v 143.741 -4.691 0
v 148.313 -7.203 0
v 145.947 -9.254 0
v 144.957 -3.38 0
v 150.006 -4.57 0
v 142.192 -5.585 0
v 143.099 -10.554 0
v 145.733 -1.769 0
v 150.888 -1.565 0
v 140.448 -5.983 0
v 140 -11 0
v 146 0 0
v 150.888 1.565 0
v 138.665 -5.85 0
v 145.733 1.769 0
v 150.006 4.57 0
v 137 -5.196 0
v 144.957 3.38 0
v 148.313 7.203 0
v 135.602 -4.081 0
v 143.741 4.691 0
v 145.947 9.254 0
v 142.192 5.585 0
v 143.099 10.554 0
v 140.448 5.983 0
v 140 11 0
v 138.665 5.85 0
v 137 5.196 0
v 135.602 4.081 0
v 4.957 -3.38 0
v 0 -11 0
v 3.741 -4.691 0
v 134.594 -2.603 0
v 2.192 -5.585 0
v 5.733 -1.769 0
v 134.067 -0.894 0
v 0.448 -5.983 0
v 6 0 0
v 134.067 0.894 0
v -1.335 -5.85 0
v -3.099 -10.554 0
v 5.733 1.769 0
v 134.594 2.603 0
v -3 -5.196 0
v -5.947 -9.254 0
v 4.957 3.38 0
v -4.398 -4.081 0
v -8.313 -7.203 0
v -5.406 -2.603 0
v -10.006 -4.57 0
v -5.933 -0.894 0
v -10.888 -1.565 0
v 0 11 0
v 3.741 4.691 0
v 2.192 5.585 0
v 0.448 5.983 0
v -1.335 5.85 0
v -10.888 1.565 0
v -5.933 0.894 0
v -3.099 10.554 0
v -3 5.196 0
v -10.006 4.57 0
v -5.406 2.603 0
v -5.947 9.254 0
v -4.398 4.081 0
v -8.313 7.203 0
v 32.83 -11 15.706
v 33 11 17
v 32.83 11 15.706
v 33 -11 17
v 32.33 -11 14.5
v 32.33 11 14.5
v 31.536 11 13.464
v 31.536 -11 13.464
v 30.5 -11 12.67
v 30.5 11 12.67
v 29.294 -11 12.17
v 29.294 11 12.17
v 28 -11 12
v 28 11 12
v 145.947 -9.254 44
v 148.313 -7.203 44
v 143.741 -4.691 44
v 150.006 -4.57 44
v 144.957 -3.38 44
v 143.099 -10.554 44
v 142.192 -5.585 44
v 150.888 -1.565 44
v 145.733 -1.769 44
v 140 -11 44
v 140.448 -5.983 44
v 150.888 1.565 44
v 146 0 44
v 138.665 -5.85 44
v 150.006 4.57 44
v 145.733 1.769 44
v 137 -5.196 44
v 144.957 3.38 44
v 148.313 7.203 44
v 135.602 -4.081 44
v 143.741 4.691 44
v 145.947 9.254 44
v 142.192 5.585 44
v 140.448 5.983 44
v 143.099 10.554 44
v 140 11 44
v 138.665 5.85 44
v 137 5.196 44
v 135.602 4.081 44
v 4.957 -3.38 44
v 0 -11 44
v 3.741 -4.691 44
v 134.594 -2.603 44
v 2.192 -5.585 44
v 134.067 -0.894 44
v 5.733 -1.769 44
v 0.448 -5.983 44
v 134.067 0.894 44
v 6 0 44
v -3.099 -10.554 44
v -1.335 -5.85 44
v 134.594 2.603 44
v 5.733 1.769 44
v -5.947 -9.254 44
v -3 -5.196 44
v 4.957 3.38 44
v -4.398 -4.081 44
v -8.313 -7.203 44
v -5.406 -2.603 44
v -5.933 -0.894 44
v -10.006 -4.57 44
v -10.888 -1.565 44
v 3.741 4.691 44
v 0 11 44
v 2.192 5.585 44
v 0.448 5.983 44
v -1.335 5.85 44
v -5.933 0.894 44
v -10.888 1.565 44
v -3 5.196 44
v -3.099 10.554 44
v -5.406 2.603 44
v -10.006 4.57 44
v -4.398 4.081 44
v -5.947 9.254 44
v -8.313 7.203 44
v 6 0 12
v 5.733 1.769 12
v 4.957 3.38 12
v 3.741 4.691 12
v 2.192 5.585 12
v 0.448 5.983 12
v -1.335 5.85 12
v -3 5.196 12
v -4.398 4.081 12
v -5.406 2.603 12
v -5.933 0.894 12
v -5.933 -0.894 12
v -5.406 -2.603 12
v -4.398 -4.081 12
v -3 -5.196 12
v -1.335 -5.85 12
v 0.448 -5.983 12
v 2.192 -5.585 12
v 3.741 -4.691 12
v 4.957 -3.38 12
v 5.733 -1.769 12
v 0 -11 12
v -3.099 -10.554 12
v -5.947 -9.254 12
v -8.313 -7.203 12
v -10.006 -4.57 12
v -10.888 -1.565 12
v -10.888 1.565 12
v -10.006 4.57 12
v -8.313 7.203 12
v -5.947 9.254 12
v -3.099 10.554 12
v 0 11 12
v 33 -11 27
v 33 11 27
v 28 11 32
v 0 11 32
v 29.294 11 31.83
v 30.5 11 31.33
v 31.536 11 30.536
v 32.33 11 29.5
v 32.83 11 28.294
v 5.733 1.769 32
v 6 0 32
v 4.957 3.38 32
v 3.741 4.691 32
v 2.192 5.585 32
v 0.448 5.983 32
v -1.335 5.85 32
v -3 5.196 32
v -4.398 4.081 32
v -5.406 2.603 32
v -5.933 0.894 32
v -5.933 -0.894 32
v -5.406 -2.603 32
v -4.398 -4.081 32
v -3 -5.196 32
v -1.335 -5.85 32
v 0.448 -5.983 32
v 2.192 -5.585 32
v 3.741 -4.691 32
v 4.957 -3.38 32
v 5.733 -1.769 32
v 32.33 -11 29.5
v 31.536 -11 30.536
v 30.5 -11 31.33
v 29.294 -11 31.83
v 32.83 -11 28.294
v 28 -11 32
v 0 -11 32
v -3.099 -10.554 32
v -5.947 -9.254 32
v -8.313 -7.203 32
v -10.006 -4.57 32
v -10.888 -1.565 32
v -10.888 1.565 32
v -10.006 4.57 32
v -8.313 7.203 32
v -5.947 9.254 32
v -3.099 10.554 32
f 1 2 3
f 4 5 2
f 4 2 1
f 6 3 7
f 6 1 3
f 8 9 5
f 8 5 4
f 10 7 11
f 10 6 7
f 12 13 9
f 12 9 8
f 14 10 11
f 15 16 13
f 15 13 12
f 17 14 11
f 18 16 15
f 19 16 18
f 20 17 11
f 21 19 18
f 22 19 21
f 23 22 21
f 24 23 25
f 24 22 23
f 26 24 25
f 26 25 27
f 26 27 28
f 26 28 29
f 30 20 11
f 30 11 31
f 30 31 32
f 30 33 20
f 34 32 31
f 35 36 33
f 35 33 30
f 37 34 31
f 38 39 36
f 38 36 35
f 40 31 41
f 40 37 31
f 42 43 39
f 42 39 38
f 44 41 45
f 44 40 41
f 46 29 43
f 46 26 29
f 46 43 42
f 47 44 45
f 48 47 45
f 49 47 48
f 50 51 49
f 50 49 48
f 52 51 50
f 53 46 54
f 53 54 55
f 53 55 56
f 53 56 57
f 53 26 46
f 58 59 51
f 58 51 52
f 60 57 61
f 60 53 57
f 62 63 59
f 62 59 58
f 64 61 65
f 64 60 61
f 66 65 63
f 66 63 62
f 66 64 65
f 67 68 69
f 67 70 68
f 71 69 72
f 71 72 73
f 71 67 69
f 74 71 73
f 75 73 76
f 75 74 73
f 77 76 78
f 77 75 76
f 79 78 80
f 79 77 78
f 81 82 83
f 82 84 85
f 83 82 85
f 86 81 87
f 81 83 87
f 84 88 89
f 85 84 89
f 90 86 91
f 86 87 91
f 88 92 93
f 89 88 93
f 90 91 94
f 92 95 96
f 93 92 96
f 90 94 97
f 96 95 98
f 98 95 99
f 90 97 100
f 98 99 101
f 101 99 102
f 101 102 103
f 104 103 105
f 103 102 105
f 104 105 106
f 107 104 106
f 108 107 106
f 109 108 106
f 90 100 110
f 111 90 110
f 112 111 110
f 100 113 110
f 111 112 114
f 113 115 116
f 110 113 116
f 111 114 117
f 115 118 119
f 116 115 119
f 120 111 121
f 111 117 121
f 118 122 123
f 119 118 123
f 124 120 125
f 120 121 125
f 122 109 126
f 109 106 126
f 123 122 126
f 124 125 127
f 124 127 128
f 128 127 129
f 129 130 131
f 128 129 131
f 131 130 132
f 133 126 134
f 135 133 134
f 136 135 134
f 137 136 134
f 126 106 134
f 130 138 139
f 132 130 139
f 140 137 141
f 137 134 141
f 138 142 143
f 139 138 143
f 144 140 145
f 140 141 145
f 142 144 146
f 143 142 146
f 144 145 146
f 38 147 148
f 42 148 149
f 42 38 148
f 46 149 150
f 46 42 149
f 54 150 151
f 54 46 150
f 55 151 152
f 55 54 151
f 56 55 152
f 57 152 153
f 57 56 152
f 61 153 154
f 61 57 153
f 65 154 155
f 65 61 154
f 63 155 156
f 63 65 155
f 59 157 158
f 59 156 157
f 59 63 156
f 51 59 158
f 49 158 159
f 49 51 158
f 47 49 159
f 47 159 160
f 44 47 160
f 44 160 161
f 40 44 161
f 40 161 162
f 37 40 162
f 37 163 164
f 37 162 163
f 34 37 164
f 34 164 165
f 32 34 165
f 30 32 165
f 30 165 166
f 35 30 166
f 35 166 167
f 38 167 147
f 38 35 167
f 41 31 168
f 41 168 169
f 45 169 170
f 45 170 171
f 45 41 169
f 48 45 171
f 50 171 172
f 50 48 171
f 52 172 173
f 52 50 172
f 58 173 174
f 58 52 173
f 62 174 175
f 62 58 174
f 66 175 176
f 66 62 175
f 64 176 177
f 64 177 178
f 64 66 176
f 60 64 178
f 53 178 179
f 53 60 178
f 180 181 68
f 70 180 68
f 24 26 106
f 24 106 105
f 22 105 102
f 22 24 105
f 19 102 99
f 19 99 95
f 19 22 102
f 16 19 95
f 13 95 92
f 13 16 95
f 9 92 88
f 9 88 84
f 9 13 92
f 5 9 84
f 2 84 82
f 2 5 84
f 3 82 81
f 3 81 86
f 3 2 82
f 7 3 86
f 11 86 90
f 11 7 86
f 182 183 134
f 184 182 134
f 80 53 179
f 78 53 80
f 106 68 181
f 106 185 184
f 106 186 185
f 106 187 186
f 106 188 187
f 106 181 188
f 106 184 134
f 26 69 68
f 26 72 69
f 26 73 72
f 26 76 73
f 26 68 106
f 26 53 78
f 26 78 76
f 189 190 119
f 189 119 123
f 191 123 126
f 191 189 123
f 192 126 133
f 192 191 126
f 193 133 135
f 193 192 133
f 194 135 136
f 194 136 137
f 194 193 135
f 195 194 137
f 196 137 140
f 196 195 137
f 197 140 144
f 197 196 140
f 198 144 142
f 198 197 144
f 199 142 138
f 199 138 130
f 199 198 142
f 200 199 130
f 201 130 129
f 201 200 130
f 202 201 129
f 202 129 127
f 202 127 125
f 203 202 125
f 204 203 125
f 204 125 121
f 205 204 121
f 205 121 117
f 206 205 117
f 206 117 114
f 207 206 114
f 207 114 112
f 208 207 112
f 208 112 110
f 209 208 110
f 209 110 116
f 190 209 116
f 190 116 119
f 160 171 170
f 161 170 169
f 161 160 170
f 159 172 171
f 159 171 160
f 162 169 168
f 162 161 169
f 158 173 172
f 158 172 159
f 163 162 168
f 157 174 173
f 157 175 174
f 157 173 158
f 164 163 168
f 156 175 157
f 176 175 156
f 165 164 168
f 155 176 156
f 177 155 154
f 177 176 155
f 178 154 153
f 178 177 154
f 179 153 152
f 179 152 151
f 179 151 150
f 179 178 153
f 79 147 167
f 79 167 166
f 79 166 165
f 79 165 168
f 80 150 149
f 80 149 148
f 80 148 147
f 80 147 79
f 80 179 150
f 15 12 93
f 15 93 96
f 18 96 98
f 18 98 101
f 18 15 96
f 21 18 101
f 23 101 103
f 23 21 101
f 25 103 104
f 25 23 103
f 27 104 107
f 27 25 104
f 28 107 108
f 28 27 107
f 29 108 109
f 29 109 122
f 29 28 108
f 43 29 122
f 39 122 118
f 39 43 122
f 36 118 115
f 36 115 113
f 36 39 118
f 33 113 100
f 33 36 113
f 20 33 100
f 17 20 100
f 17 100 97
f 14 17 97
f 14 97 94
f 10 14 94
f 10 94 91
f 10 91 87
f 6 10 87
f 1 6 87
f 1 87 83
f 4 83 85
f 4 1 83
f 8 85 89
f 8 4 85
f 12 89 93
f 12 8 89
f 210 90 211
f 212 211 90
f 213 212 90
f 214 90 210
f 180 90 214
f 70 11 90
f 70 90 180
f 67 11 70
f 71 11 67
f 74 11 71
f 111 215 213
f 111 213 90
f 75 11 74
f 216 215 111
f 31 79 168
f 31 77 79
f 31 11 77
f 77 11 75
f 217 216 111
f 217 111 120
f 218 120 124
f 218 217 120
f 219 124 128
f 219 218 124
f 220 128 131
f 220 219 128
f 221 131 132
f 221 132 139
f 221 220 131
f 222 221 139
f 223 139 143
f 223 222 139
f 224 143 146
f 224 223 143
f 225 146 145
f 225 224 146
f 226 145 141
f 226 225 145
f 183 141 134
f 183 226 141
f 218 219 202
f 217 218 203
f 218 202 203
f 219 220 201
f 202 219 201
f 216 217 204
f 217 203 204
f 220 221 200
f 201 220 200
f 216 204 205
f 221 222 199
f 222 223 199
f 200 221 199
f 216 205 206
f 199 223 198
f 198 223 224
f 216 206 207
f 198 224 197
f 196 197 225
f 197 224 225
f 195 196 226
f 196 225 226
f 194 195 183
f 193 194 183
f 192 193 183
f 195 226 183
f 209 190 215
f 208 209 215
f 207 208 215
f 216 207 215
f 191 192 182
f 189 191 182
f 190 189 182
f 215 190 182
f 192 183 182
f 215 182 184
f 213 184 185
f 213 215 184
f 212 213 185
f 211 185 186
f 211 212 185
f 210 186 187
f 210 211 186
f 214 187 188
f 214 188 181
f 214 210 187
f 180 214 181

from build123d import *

# Parameters (mm, degrees)
SKETCH1_R           = 6
BOSS_EXTRUDE1_DEPTH = 44
SKETCH2_W           = 88
SKETCH2_H           = 20
CUT_EXTRUDE1_DEPTH  = 159.811208672
FILLET1_R           = 5


with BuildPart() as part:
    # Sketch1 → Boss-Extrude1 (new body)
    with BuildSketch(Plane.XY):
        with BuildLine():
            Line((0, 11), (140, 11))
            ThreePointArc((140, 11), (151, 0), (140, -11))
            Line((140, -11), (0, -11))
            ThreePointArc((0, -11), (-11, 0), (0, 11))
        make_face()
        Circle(SKETCH1_R, mode=Mode.SUBTRACT)
        with Locations((140, 0)):
            Circle(SKETCH1_R, mode=Mode.SUBTRACT)
    extrude(amount=BOSS_EXTRUDE1_DEPTH)

    # Sketch2 → Cut-Extrude1 (cut, through all)
    with BuildSketch(Plane(origin=(0, 11, 0), x_dir=(1, 0, 0), z_dir=(0, 1, 0))):
        with Locations((-11, -22)):
            Rectangle(SKETCH2_W, SKETCH2_H)
    extrude(amount=-CUT_EXTRUDE1_DEPTH, mode=Mode.SUBTRACT)

    # Fillet1
    fillet1_edges = [part.edges().sort_by_distance(p)[0] for p in [
        (33, 0, 32),
        (33, 0, 12),
    ]]
    fillet(fillet1_edges, radius=FILLET1_R)


solid = part.part
